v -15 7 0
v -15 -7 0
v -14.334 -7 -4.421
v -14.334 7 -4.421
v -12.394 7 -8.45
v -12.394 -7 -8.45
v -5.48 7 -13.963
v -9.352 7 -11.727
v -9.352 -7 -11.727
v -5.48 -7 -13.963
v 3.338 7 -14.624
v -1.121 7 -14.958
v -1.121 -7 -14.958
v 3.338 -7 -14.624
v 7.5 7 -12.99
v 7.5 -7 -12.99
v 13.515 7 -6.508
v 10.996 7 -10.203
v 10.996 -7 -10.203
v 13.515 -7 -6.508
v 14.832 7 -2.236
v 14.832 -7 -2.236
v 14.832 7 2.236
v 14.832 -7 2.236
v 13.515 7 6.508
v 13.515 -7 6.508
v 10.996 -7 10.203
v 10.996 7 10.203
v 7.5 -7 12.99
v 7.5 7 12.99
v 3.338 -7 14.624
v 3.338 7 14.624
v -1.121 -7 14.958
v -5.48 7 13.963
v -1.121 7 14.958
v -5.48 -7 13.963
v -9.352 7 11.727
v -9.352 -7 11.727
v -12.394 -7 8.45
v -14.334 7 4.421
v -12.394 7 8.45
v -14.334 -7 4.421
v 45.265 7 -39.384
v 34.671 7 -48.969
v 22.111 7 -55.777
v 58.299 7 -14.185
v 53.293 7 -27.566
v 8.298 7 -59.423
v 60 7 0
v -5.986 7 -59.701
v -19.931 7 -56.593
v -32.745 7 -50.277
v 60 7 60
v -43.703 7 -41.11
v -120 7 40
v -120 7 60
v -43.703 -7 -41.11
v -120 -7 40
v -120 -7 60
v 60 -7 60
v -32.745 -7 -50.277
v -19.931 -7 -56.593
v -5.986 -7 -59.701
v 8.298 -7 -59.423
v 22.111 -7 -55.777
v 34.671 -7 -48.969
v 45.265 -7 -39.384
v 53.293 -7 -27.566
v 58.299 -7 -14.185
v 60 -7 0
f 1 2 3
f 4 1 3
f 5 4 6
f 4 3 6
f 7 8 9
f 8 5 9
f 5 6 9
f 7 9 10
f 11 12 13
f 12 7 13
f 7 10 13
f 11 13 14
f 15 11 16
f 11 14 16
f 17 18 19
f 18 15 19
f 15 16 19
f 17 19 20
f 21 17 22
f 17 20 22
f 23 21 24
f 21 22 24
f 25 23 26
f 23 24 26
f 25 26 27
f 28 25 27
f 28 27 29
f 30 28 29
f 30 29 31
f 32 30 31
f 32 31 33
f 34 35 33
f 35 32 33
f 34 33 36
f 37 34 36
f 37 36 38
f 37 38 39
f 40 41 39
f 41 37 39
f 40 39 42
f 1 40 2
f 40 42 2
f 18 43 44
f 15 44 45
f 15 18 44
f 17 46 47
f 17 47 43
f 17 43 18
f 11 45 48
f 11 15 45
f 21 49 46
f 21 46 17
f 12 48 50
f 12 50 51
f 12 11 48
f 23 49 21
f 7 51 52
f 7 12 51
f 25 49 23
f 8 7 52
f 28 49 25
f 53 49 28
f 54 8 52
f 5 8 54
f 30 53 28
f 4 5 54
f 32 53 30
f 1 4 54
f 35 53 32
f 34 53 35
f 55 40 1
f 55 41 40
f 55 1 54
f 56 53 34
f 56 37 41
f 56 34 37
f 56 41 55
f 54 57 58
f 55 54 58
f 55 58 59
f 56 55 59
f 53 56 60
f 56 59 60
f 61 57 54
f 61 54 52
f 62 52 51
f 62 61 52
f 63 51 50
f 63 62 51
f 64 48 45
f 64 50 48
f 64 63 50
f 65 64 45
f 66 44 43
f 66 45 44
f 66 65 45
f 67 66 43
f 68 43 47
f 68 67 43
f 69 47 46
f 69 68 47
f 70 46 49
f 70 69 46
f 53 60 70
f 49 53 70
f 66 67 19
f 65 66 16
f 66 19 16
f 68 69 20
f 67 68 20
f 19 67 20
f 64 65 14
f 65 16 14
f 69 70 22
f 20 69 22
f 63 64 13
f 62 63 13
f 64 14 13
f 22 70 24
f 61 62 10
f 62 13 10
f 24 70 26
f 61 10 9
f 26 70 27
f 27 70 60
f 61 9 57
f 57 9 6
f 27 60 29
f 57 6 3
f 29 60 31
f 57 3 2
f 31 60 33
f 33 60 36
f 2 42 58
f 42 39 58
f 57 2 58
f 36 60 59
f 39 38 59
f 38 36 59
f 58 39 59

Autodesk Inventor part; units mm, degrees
ref_plane "YZ Plane" through (0, 0, 0) normal (1, 0, 0) x (0, 1, 0)
ref_plane "XZ Plane" through (0, 0, 0) normal (0, 1, 0) x (-1, 0, 0)
ref_plane "XY Plane" through (0, 0, 0) normal (0, 0, 1) x (1, 0, 0)
sketch "Boceto2" plane through (0, 0, 0) normal (0, 1, 0) x (-1, 0, 0)
  circle A0 centre (0, 0) radius 15
  arc A1 (-60, 0) -> (43.7033, -41.1099) centre (0, 0) ccw
  line L0 (43.7033, -41.1099) -> (120, 40)
  line L1 (120, 40) -> (120, 60)
  line L2 (120, 60) -> (-60, 60)
  line L3 (-60, 60) -> (-60, 0)
  line L4 (0, 0) -> (43.7033, -41.1099) construction
  line L5 (0, 0) -> (-60, 0) construction
  dimension "d7" = 60
  dimension "d8" = 20
  dimension "d9" = 60
  dimension "d10" = 180
  dimension "d11" = 30
extrude "Placa2" add sketch "Boceto2" along normal mid plane 14
equation "\"d7\" = h_"
equation "\"d8\" = b"
equation "\"d9\" = r"
equation "\"d10\" = L"
equation "\"d11\" = hole"
equation "\"d12\" = Grosor"
equation "\"Grosor\" = epl"
equation "\"Radio_pliegue\" = Grosor"
equation "\"Anchura_desahogo_plegado\" = Grosor"
equation "\"Profundidad_desahogo_plegado\" = 0.5 * Grosor"
equation "\"Tamaño_destalonado\" = 4 * Grosor"
equation "\"Remanente_mínimo\" = 2 * Grosor"
equation "\"Radiodetransición\" = Radio_pliegue"
equation "\"Tamaño_de_radio_de_Jacobi\" = Radio_pliegue"
equation "\"TamañoSeparación\" = Grosor"
equation "\"L\" = 180"
equation "\"epl\" = 14"
equation "\"h_\" = 60"
equation "\"r\" = 60"
equation "\"hole\" = 30"
equation "\"hole_gr\" = 25.4"
equation "\"a\" = 7"
equation "\"b\" = 20"
equation "\"eb\" = 7"
equation "\"grillete\" = 0.875"
properties part number "CSM-EB-EPP-001-PL-001" material "Acero ASTM A36"
